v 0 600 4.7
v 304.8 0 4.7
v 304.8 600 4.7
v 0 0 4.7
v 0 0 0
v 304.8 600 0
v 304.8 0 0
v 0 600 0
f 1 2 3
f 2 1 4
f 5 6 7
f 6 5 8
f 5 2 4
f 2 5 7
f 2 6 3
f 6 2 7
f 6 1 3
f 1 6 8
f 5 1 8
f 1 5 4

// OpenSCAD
materialThickness=4.7; //this is in MM
cutSheetX=304.8;
cutSheetY=600;

module cutSheet(){
	cube([cutSheetX,cutSheetY,materialThickness]);
	
}

cutSheet();
